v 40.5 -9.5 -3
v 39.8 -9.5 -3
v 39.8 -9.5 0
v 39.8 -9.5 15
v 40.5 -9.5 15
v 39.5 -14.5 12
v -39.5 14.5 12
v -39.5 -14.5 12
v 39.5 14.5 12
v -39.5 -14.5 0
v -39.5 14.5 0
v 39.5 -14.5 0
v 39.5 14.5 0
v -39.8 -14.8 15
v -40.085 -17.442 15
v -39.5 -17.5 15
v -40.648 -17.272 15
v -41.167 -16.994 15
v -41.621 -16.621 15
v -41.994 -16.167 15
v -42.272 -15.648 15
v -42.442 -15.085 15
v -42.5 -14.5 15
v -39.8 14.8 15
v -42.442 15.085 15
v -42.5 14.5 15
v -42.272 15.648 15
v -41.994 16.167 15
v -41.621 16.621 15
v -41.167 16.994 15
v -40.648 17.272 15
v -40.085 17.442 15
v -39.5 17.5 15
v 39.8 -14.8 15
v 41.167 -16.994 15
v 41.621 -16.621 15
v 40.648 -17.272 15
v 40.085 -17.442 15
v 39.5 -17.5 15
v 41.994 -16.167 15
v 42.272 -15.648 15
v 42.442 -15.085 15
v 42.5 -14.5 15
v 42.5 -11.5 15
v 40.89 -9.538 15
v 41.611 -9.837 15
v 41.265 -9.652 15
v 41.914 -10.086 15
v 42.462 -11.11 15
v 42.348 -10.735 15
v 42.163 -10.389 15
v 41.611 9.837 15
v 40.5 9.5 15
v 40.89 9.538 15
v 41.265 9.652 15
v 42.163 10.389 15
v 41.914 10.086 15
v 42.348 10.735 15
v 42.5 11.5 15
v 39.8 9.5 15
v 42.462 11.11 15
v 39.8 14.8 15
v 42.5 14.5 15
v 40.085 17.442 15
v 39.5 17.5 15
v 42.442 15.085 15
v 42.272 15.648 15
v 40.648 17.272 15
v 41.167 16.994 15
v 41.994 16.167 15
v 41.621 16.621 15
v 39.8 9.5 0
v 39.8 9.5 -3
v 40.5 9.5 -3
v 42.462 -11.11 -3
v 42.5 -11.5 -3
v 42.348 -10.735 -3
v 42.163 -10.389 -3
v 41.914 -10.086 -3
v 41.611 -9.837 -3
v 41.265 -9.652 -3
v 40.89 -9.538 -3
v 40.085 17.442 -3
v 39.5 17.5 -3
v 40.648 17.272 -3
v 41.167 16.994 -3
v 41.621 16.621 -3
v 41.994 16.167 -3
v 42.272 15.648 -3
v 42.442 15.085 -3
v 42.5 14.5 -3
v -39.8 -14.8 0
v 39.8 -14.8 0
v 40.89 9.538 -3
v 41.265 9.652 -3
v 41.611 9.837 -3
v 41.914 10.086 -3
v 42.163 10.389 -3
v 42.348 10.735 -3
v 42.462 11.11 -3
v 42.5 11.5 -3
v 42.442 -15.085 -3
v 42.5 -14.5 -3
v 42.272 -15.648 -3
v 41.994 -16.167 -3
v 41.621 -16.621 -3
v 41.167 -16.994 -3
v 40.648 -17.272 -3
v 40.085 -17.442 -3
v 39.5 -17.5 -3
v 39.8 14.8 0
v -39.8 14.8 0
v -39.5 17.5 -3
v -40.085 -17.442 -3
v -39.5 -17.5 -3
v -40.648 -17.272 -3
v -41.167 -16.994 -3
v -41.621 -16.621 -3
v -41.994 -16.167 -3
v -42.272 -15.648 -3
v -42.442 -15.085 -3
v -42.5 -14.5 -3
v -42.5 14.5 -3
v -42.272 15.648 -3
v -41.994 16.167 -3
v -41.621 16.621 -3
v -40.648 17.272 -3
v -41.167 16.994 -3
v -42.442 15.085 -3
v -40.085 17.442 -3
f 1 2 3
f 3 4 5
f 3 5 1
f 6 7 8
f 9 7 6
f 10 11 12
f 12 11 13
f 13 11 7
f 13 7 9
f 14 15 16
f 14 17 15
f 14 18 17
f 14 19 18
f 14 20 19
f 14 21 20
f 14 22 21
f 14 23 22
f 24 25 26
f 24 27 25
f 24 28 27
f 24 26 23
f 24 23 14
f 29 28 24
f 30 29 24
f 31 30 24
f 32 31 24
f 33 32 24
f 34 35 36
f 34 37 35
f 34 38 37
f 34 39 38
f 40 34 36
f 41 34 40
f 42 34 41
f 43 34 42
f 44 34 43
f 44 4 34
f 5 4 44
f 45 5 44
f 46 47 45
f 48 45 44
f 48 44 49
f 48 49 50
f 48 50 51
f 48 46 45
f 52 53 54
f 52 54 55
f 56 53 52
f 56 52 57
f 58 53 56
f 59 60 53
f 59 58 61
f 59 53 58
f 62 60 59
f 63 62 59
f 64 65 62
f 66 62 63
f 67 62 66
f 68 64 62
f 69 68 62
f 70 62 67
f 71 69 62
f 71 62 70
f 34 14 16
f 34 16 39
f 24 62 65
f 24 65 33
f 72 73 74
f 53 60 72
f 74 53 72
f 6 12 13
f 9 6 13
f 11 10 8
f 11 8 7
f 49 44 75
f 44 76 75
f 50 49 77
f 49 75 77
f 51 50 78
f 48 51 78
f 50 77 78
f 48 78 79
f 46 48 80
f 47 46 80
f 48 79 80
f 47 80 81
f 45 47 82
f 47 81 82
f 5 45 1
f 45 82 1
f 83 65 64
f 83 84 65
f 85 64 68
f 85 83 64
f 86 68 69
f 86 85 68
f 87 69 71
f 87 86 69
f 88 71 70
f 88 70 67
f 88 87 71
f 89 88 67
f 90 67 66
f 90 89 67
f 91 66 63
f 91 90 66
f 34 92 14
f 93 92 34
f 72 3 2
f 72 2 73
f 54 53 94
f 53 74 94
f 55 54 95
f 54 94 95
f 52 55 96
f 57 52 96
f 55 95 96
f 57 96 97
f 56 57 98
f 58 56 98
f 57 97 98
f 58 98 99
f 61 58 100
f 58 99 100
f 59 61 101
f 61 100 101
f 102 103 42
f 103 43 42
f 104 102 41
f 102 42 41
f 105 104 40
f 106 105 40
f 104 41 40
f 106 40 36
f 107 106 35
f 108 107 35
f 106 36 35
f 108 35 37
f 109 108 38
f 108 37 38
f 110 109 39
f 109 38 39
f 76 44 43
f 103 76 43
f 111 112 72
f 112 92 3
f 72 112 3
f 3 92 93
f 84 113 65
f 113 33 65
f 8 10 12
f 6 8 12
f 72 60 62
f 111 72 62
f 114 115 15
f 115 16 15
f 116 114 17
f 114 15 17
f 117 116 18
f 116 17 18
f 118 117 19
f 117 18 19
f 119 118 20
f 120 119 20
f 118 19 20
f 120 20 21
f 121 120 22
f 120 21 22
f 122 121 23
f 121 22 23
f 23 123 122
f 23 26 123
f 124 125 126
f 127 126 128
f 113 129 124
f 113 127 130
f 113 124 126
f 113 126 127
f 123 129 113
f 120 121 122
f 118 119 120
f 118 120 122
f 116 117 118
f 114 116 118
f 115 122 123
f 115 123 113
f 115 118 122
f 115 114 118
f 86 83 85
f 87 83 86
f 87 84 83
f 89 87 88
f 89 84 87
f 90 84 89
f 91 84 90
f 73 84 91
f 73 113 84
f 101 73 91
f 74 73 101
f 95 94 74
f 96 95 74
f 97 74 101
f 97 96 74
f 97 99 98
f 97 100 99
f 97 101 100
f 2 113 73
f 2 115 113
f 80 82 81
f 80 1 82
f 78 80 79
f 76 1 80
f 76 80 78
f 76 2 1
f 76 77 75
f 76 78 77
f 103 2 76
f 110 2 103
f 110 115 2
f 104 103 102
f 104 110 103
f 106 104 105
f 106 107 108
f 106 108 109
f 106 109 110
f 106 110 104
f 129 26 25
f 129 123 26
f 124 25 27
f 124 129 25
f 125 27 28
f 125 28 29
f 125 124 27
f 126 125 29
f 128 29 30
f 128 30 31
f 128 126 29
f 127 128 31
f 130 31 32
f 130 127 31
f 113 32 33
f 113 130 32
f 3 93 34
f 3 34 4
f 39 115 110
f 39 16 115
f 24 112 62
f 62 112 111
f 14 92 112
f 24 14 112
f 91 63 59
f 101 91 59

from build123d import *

# Parameters (mm, degrees)
F0_W     = 79
F0_H     = 29
F1_DEPTH = 12
F2_W     = 85
F2_H     = 35
F2_W_2   = 79.6
F2_H_2   = 29.6
F3_DEPTH = 15
F4_W     = 85
F4_H     = 35
F5_DEPTH = 3
F6_W     = 2.7
F6_H     = 19
F7_DEPTH = 25
F8_R     = 2
F9_R     = 3


with BuildPart() as f1:
    # F0 (on Top) → F1 (new body)
    with BuildSketch(Plane.XY):
        Rectangle(F0_W, F0_H)
    extrude(amount=F1_DEPTH)


with BuildPart() as f3:
    # F2 (on Top) → F3 (new body)
    with BuildSketch(Plane.XY):
        Rectangle(F2_W, F2_H)
        Rectangle(F2_W_2, F2_H_2, mode=Mode.SUBTRACT)
    extrude(amount=F3_DEPTH)

    # F4 (on face) → F5 (join)
    with BuildSketch(Plane(origin=(0, 0, 0), x_dir=(1, 0, 0), z_dir=(0, 0, -1))):
        Rectangle(F4_W, F4_H)
    extrude(amount=F5_DEPTH)

    # F6 (on face) → F7 (cut)
    with BuildSketch(Plane.XY.offset(15)):
        with Locations((41.15, 0)):
            Rectangle(F6_W, F6_H)
    extrude(amount=-F7_DEPTH, mode=Mode.SUBTRACT)

    # F8
    f8_edges = [f3.edges().sort_by_distance(p)[0] for p in [
        (42.5, -9.5, 6),
        (42.5, 9.5, 6),
    ]]
    fillet(f8_edges, radius=F8_R)

    # F9
    f9_edges = [f3.edges().sort_by_distance(p)[0] for p in [
        (42.5, -17.5, 6),
        (-42.5, -17.5, 6),
        (-42.5, 17.5, 6),
        (42.5, 17.5, 6),
    ]]
    fillet(f9_edges, radius=F9_R)


solid = Compound([f1.part, f3.part])
